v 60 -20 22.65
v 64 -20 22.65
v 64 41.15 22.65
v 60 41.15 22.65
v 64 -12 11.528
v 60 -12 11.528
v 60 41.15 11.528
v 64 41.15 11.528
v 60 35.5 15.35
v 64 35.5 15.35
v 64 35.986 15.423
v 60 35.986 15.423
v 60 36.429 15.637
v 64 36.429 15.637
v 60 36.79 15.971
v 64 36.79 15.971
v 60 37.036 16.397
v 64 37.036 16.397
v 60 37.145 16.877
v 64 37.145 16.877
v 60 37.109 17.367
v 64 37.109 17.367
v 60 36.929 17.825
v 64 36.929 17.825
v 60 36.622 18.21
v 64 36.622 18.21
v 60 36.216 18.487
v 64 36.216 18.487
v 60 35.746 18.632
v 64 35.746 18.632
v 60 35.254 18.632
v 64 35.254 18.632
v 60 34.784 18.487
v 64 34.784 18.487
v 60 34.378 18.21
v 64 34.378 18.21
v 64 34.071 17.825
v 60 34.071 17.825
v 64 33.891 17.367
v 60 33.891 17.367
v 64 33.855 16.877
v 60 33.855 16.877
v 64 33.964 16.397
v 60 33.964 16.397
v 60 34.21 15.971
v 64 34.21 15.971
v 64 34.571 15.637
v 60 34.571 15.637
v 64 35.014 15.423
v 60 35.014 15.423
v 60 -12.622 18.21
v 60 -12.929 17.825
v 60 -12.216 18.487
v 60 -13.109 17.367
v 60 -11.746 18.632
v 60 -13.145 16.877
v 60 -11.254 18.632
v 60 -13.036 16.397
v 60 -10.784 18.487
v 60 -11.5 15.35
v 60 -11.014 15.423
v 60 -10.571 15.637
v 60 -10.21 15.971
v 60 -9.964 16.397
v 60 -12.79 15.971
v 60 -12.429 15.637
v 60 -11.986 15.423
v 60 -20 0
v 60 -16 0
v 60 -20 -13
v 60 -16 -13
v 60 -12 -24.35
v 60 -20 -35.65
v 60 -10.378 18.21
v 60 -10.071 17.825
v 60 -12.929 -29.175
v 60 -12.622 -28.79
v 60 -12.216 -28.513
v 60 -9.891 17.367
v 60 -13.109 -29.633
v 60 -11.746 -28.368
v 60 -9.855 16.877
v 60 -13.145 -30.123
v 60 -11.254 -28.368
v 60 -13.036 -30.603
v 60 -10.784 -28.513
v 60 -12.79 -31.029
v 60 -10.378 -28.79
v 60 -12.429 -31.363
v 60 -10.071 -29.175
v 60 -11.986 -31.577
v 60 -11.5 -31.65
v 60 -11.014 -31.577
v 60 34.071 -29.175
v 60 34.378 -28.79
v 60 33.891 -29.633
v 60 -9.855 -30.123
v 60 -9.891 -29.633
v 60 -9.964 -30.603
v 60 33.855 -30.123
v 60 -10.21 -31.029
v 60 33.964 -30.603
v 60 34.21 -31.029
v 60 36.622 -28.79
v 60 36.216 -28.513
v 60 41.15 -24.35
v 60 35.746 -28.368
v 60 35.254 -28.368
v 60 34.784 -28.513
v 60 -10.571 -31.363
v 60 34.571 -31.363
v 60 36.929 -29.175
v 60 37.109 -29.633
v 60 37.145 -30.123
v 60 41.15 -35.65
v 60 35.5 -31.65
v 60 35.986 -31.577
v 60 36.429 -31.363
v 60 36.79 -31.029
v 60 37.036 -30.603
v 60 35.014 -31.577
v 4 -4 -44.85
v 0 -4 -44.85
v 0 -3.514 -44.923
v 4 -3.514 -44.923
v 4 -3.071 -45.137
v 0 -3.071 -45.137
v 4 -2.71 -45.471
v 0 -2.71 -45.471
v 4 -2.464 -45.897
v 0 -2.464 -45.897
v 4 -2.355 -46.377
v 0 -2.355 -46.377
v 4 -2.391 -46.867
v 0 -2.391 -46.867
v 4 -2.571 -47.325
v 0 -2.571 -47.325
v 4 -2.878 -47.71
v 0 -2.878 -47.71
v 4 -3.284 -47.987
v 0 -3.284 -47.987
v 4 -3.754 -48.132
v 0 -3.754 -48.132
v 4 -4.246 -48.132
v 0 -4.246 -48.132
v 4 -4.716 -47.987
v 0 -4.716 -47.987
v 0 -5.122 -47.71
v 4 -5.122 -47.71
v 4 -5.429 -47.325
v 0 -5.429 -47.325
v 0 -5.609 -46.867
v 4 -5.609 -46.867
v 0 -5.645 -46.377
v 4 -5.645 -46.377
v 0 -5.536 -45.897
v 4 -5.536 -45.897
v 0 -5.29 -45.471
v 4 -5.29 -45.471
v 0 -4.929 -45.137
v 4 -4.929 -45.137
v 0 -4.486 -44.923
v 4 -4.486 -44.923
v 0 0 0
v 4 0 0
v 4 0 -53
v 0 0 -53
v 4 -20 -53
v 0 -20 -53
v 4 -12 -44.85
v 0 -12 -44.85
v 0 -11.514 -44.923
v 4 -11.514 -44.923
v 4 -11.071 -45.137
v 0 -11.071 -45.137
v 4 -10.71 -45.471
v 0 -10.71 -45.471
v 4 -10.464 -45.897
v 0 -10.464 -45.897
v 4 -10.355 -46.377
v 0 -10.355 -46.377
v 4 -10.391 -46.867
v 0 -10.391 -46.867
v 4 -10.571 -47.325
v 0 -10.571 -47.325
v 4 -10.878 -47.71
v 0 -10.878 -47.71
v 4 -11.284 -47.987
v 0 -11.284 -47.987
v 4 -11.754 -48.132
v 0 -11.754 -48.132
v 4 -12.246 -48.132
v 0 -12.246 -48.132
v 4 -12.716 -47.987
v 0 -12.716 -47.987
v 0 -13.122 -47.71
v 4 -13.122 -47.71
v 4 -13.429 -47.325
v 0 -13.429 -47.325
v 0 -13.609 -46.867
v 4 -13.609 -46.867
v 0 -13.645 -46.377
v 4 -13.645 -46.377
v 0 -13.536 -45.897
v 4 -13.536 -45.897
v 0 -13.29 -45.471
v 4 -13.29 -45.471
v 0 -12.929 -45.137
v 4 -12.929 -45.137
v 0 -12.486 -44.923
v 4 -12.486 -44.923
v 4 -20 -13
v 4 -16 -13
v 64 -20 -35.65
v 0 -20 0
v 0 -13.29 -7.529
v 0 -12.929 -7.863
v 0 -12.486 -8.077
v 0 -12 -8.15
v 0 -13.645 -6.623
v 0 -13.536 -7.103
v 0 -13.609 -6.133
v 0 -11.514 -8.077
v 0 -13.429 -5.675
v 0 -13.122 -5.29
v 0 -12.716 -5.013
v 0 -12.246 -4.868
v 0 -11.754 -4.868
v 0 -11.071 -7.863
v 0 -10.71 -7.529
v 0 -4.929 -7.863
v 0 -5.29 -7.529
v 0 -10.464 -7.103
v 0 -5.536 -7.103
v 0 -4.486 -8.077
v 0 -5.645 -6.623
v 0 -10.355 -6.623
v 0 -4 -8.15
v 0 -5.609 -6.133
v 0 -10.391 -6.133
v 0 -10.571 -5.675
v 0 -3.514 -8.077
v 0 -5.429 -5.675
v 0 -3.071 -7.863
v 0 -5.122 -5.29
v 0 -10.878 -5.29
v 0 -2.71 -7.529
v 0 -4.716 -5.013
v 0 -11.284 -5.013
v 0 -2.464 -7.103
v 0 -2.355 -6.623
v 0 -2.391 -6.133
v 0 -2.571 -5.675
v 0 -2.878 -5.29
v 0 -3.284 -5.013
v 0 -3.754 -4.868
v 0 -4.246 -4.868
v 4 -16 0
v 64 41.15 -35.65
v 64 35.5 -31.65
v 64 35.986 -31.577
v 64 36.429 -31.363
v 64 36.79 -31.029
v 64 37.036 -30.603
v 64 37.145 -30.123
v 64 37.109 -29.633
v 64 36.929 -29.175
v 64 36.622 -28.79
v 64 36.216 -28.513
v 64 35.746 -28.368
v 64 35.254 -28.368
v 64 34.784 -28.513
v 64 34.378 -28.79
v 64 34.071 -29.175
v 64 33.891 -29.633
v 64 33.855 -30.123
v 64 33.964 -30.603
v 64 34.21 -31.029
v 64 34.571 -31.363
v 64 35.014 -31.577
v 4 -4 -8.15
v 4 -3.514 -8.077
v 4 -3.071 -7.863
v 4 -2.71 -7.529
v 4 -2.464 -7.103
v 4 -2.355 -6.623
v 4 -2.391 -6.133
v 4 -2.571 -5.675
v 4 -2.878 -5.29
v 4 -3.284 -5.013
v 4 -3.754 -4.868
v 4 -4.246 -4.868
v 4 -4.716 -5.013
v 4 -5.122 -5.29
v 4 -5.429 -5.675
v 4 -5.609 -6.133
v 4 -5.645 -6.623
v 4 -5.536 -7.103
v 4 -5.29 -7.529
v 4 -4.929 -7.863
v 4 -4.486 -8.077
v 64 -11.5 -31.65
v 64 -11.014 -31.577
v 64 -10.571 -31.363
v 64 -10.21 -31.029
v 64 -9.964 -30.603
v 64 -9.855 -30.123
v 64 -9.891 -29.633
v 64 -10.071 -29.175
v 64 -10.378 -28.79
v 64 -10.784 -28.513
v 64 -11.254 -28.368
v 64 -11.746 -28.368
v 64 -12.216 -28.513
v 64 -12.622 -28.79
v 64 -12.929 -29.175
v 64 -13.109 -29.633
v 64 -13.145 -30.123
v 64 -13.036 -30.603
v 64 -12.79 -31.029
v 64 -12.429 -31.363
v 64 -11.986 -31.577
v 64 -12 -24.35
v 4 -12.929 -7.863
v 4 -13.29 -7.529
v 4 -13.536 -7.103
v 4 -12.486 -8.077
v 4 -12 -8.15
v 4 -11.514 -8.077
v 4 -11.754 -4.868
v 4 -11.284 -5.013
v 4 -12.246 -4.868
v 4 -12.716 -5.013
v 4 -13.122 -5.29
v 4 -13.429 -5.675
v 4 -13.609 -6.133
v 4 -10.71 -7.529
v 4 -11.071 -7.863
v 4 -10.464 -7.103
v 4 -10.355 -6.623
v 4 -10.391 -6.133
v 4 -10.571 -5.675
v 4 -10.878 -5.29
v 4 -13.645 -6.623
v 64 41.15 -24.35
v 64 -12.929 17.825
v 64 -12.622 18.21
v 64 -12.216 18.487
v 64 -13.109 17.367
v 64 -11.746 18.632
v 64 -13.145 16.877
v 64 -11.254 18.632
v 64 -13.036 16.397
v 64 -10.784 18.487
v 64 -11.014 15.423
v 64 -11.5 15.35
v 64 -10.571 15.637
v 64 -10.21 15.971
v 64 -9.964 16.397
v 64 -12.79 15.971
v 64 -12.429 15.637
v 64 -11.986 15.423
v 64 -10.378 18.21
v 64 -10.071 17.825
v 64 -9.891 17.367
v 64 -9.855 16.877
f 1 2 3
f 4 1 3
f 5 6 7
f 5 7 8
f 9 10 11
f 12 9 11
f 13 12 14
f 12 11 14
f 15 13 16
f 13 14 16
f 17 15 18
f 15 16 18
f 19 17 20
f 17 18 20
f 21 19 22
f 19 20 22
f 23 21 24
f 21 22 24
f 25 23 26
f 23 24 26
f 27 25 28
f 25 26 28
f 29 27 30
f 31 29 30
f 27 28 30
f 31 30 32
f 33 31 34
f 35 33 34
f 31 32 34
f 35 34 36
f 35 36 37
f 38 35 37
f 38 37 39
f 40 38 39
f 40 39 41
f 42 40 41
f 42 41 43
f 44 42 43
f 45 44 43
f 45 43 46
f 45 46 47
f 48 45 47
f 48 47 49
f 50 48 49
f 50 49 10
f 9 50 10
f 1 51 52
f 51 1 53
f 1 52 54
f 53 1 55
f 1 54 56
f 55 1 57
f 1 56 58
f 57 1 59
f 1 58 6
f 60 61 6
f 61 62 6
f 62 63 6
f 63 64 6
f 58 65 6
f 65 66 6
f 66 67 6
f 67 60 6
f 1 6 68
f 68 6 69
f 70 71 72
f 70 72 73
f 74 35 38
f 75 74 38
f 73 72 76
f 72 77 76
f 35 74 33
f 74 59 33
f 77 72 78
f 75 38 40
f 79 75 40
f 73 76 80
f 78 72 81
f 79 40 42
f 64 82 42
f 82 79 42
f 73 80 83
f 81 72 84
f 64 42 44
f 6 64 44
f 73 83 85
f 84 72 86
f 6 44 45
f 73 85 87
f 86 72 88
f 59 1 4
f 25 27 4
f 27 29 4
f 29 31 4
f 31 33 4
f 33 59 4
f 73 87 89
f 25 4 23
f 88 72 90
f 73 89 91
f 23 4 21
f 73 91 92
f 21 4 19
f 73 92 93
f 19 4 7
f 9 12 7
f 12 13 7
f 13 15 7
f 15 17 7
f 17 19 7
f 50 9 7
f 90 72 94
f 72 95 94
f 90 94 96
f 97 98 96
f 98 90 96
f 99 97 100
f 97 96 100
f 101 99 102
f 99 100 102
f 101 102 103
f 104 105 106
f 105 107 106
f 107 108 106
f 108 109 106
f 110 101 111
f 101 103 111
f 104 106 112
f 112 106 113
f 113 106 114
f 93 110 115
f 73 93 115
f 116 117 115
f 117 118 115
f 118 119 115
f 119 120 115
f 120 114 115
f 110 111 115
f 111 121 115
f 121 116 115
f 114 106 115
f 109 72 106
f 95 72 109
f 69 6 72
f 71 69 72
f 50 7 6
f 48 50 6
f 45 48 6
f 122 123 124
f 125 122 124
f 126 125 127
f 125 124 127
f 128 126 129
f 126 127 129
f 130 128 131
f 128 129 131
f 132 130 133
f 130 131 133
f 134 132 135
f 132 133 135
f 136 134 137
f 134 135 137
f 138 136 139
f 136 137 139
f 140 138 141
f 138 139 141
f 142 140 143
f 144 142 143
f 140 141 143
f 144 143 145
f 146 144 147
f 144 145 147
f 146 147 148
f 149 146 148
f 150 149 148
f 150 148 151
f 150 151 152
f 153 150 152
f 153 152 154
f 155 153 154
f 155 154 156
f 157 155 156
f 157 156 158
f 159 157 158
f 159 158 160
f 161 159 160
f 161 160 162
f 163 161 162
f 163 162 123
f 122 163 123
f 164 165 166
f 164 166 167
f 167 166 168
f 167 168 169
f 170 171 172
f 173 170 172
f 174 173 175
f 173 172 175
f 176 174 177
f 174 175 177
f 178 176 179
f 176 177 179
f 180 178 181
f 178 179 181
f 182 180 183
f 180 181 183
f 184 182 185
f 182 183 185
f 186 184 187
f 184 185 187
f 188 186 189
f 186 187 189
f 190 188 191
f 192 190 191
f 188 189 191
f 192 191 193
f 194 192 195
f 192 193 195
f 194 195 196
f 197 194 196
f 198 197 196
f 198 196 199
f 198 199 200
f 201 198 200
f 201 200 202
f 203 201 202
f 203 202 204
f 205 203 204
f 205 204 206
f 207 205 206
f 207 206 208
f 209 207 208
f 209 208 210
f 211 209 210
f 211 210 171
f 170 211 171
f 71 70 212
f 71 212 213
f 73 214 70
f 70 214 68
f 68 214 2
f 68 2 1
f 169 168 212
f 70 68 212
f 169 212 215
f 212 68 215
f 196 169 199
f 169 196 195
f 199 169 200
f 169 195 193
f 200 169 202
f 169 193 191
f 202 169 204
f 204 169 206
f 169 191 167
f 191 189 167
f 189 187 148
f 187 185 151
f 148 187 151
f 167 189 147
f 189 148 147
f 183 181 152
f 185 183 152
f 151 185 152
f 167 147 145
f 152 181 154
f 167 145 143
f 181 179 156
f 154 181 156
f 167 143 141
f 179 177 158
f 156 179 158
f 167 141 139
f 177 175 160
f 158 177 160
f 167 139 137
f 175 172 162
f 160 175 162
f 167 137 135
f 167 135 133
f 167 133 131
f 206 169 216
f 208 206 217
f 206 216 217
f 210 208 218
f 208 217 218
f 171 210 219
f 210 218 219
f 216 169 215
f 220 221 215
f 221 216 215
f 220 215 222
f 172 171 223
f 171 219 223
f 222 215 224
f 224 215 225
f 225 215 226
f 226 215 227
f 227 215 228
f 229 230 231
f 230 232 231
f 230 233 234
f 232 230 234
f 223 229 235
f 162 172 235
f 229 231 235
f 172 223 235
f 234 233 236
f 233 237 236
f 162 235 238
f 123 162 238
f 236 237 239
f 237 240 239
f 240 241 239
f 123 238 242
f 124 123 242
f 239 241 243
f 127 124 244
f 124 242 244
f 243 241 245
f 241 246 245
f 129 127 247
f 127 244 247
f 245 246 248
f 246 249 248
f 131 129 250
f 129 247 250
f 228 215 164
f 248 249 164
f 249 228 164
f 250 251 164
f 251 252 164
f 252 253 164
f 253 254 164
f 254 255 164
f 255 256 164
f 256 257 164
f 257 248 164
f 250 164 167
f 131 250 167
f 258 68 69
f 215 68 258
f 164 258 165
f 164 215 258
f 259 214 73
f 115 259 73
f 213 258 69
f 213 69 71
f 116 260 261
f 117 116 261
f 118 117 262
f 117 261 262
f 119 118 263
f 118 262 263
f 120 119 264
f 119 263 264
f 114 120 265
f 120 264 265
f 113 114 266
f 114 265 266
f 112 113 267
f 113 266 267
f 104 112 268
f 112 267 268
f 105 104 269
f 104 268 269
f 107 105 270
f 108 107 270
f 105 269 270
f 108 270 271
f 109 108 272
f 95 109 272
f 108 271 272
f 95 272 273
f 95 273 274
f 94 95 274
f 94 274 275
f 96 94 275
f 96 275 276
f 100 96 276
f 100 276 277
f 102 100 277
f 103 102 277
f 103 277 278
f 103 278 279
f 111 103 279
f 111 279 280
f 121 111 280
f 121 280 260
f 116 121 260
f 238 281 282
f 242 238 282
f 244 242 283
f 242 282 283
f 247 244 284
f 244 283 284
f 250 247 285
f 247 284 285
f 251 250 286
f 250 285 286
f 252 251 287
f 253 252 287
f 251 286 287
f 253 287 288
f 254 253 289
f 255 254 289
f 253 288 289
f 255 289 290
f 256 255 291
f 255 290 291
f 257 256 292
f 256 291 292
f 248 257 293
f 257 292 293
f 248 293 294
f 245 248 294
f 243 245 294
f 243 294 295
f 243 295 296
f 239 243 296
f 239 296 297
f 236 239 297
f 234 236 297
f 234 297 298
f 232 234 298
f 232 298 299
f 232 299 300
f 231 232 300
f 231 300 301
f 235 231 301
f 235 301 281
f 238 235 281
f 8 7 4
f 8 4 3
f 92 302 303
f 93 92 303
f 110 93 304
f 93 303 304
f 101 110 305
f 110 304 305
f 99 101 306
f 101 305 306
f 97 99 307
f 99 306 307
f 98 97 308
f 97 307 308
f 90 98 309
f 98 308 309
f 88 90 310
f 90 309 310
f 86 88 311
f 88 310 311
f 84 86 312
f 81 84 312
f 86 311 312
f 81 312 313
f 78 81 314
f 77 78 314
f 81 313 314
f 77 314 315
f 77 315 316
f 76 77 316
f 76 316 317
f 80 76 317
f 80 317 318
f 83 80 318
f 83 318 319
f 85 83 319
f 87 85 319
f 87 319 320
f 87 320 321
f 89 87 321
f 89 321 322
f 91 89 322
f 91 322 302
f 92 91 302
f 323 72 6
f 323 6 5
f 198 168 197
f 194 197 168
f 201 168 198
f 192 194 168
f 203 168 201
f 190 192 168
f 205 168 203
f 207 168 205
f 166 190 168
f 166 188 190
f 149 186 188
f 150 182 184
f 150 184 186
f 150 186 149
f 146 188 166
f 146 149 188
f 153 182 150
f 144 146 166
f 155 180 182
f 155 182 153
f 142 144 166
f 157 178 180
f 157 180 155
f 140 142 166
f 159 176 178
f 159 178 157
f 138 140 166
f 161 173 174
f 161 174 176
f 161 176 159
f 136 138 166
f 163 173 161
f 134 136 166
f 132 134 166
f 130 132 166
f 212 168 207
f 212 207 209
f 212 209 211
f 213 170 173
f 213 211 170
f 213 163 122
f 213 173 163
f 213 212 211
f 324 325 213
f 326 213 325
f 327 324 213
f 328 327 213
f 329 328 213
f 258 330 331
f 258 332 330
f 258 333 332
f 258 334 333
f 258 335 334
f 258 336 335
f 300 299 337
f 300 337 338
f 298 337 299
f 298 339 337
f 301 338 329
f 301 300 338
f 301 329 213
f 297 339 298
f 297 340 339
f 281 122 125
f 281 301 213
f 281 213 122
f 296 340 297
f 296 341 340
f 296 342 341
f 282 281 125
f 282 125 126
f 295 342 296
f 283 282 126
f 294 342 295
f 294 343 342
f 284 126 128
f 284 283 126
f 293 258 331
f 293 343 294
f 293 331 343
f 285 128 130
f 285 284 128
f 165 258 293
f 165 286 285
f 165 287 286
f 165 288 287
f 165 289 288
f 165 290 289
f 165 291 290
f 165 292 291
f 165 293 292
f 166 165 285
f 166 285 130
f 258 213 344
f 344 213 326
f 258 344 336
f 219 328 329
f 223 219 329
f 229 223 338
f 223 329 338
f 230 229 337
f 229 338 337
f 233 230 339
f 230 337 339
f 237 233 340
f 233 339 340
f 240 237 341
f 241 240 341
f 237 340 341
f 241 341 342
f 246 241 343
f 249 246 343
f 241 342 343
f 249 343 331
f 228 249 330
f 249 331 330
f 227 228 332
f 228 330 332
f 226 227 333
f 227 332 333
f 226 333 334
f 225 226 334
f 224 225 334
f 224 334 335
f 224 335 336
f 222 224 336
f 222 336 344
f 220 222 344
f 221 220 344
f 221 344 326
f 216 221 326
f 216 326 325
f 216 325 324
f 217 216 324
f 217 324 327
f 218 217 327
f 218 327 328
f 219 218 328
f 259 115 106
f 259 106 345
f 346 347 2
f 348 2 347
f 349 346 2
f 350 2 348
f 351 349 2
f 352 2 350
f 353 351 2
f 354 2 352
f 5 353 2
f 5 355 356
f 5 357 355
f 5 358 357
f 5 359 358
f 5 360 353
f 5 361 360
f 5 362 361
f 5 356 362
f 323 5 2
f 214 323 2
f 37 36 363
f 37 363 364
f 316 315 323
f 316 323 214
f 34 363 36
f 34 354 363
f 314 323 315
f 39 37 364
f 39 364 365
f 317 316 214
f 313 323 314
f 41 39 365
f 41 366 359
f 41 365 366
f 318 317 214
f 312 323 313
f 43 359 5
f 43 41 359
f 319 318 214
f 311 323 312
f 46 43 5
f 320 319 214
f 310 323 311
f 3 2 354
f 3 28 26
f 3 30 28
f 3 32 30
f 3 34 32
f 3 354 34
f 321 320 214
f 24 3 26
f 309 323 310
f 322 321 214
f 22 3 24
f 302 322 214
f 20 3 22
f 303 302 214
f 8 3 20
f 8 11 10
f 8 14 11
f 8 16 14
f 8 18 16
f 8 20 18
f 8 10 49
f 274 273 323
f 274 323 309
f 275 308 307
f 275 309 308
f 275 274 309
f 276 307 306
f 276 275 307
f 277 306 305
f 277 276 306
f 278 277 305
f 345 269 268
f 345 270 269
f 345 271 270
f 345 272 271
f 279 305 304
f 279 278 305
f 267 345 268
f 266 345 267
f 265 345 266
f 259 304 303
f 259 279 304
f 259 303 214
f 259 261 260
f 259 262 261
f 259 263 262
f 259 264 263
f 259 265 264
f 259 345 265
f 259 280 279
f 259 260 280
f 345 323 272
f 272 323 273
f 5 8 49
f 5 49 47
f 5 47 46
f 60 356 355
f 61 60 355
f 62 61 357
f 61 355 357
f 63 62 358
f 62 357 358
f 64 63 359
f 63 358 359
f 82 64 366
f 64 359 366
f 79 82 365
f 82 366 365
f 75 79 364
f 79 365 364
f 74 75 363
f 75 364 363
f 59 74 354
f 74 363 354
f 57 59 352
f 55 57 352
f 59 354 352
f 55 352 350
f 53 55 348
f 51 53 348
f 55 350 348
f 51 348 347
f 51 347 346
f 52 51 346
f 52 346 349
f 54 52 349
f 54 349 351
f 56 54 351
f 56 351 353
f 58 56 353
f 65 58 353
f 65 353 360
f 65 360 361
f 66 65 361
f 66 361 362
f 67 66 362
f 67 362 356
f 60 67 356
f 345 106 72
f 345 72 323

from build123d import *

# Parameters (mm, degrees)
SKETCH1_W            = 13
SKETCH1_H            = 16
BOSS_EXTRUDE1_DEPTH  = 4
SKETCH2_R            = 1.65
CUT_EXTRUDE1_DEPTH   = 10
SKETCH3_W            = 4
SKETCH3_H            = 13
BOSS_EXTRUDE2_DEPTH  = 4
SKETCH4_W            = 13
SKETCH4_H            = 4
BOSS_EXTRUDE3_DEPTH  = 60
SKETCH6_W            = 4
SKETCH6_H            = 21
SKETCH6_H_2          = 13
BOSS_EXTRUDE4_DEPTH  = 28
SKETCH12_W           = 4
SKETCH12_H           = 28
BOSS_EXTRUDE8_DEPTH  = 1.65
SKETCH13_W           = 4
SKETCH13_H           = 28
BOSS_EXTRUDE9_DEPTH  = 1.65
SKETCH14_W           = 4
SKETCH14_H           = 35.878399396
CUT_EXTRUDE5_DEPTH   = 24
SKETCH15_R           = 1.65
CUT_EXTRUDE6_DEPTH   = 24
SKETCH16_W           = 4
SKETCH16_H           = 11.121600604
SKETCH16_H_2         = 11.3
BOSS_EXTRUDE10_DEPTH = 29.15
SKETCH17_R           = 1.65
CUT_EXTRUDE8_DEPTH   = 29.15
SKETCH18_W           = 22.65
SKETCH18_H           = 4
SKETCH18_W_2         = 13
BOSS_EXTRUDE11_DEPTH = 4
SKETCH19_W           = 4
SKETCH19_H           = 20
BOSS_EXTRUDE12_DEPTH = 40
SKETCH20_R           = 1.65
CUT_EXTRUDE9_DEPTH   = 40


with BuildPart() as part:
    # Sketch1 → Boss-Extrude1 (new body)
    with BuildSketch(Plane(origin=(0, 0, 0), x_dir=(0, 0, -1), z_dir=(1, 0, 0))):
        with Locations((6.5, -8)):
            Rectangle(SKETCH1_W, SKETCH1_H)
    extrude(amount=BOSS_EXTRUDE1_DEPTH)

    # Sketch2 → Cut-Extrude1 (cut)
    with BuildSketch(Plane(origin=(4, 0, 0), x_dir=(0, 0, -1), z_dir=(1, 0, 0))):
        with Locations((6.5, -4)):
            Circle(SKETCH2_R)
        with Locations((6.5, -12)):
            Circle(SKETCH2_R)
    extrude(amount=-CUT_EXTRUDE1_DEPTH, mode=Mode.SUBTRACT)

    # Sketch3 → Boss-Extrude2 (add)
    with BuildSketch(Plane.XZ.offset(16)):
        with Locations((2, -6.5)):
            Rectangle(SKETCH3_W, SKETCH3_H)
    extrude(amount=BOSS_EXTRUDE2_DEPTH)

    # Sketch4 → Boss-Extrude3 (add)
    with BuildSketch(Plane(origin=(4, 0, 0), x_dir=(0, 0, -1), z_dir=(1, 0, 0))):
        with Locations((6.5, -18)):
            Rectangle(SKETCH4_W, SKETCH4_H)
    extrude(amount=BOSS_EXTRUDE3_DEPTH)

    # Sketch6 → Boss-Extrude4 (add)
    with BuildSketch(Plane(origin=(0, -16, 0), x_dir=(1, 0, 0), z_dir=(0, 1, 0))):
        with Locations((62, -10.5)):
            Rectangle(SKETCH6_W, SKETCH6_H)
        with Locations((62, 23.5)):
            Rectangle(SKETCH6_W, SKETCH6_H)
        with Locations((62, 6.5)):
            Rectangle(SKETCH6_W, SKETCH6_H_2)
    extrude(amount=BOSS_EXTRUDE4_DEPTH)

    # Sketch12 → Boss-Extrude8 (add)
    with BuildSketch(Plane(origin=(0, 0, -34), x_dir=(-1, 0, 0), z_dir=(0, 0, -1))):
        with Locations((-62, -2)):
            Rectangle(SKETCH12_W, SKETCH12_H)
    extrude(amount=BOSS_EXTRUDE8_DEPTH)

    # Sketch13 → Boss-Extrude9 (add)
    with BuildSketch(Plane.XY.offset(21)):
        with Locations((62, -2)):
            Rectangle(SKETCH13_W, SKETCH13_H)
    extrude(amount=BOSS_EXTRUDE9_DEPTH)

    # Sketch14 → Cut-Extrude5 (cut)
    with BuildSketch(Plane(origin=(0, 12, 0), x_dir=(1, 0, 0), z_dir=(0, 1, 0))):
        with Locations((62, 6.410800302)):
            Rectangle(SKETCH14_W, SKETCH14_H)
    extrude(amount=-CUT_EXTRUDE5_DEPTH, mode=Mode.SUBTRACT)

    # Sketch15 → Cut-Extrude6 (cut)
    with BuildSketch(Plane(origin=(64, 0, 0), x_dir=(0, 0, -1), z_dir=(1, 0, 0))):
        with Locations((-17, -11.5)):
            Circle(SKETCH15_R)
        with Locations((30, -11.5)):
            Circle(SKETCH15_R)
    extrude(amount=-CUT_EXTRUDE6_DEPTH, mode=Mode.SUBTRACT)

    # Sketch16 → Boss-Extrude10 (add)
    with BuildSketch(Plane(origin=(0, 12, 0), x_dir=(1, 0, 0), z_dir=(0, 1, 0))):
        with Locations((62, -17.089199698)):
            Rectangle(SKETCH16_W, SKETCH16_H)
        with Locations((62, 30)):
            Rectangle(SKETCH16_W, SKETCH16_H_2)
    extrude(amount=BOSS_EXTRUDE10_DEPTH)

    # Sketch17 → Cut-Extrude8 (cut)
    with BuildSketch(Plane(origin=(64, 0, 0), x_dir=(0, 0, -1), z_dir=(1, 0, 0))):
        with Locations((-17, 35.5)):
            Circle(SKETCH17_R)
        with Locations((30, 35.5)):
            Circle(SKETCH17_R)
    extrude(amount=-CUT_EXTRUDE8_DEPTH, mode=Mode.SUBTRACT)

    # Sketch18 → Boss-Extrude11 (add)
    with BuildSketch(Plane(origin=(64, 0, 0), x_dir=(0, 0, -1), z_dir=(1, 0, 0))):
        with Locations((-11.325, -18)):
            Rectangle(SKETCH18_W, SKETCH18_H)
        with Locations((24.325, -18)):
            Rectangle(SKETCH18_W, SKETCH18_H)
        with Locations((6.5, -18)):
            Rectangle(SKETCH18_W_2, SKETCH18_H)
    extrude(amount=-BOSS_EXTRUDE11_DEPTH)

    # Sketch19 → Boss-Extrude12 (add)
    with BuildSketch(Plane(origin=(0, 0, -13), x_dir=(-1, 0, 0), z_dir=(0, 0, -1))):
        with Locations((-2, -10)):
            Rectangle(SKETCH19_W, SKETCH19_H)
    extrude(amount=BOSS_EXTRUDE12_DEPTH)

    # Sketch20 → Cut-Extrude9 (cut)
    with BuildSketch(Plane.ZY):
        with Locations((-46.5, -4)):
            Circle(SKETCH20_R)
        with Locations((-46.5, -12)):
            Circle(SKETCH20_R)
    extrude(amount=-CUT_EXTRUDE9_DEPTH, mode=Mode.SUBTRACT)


solid = part.part
